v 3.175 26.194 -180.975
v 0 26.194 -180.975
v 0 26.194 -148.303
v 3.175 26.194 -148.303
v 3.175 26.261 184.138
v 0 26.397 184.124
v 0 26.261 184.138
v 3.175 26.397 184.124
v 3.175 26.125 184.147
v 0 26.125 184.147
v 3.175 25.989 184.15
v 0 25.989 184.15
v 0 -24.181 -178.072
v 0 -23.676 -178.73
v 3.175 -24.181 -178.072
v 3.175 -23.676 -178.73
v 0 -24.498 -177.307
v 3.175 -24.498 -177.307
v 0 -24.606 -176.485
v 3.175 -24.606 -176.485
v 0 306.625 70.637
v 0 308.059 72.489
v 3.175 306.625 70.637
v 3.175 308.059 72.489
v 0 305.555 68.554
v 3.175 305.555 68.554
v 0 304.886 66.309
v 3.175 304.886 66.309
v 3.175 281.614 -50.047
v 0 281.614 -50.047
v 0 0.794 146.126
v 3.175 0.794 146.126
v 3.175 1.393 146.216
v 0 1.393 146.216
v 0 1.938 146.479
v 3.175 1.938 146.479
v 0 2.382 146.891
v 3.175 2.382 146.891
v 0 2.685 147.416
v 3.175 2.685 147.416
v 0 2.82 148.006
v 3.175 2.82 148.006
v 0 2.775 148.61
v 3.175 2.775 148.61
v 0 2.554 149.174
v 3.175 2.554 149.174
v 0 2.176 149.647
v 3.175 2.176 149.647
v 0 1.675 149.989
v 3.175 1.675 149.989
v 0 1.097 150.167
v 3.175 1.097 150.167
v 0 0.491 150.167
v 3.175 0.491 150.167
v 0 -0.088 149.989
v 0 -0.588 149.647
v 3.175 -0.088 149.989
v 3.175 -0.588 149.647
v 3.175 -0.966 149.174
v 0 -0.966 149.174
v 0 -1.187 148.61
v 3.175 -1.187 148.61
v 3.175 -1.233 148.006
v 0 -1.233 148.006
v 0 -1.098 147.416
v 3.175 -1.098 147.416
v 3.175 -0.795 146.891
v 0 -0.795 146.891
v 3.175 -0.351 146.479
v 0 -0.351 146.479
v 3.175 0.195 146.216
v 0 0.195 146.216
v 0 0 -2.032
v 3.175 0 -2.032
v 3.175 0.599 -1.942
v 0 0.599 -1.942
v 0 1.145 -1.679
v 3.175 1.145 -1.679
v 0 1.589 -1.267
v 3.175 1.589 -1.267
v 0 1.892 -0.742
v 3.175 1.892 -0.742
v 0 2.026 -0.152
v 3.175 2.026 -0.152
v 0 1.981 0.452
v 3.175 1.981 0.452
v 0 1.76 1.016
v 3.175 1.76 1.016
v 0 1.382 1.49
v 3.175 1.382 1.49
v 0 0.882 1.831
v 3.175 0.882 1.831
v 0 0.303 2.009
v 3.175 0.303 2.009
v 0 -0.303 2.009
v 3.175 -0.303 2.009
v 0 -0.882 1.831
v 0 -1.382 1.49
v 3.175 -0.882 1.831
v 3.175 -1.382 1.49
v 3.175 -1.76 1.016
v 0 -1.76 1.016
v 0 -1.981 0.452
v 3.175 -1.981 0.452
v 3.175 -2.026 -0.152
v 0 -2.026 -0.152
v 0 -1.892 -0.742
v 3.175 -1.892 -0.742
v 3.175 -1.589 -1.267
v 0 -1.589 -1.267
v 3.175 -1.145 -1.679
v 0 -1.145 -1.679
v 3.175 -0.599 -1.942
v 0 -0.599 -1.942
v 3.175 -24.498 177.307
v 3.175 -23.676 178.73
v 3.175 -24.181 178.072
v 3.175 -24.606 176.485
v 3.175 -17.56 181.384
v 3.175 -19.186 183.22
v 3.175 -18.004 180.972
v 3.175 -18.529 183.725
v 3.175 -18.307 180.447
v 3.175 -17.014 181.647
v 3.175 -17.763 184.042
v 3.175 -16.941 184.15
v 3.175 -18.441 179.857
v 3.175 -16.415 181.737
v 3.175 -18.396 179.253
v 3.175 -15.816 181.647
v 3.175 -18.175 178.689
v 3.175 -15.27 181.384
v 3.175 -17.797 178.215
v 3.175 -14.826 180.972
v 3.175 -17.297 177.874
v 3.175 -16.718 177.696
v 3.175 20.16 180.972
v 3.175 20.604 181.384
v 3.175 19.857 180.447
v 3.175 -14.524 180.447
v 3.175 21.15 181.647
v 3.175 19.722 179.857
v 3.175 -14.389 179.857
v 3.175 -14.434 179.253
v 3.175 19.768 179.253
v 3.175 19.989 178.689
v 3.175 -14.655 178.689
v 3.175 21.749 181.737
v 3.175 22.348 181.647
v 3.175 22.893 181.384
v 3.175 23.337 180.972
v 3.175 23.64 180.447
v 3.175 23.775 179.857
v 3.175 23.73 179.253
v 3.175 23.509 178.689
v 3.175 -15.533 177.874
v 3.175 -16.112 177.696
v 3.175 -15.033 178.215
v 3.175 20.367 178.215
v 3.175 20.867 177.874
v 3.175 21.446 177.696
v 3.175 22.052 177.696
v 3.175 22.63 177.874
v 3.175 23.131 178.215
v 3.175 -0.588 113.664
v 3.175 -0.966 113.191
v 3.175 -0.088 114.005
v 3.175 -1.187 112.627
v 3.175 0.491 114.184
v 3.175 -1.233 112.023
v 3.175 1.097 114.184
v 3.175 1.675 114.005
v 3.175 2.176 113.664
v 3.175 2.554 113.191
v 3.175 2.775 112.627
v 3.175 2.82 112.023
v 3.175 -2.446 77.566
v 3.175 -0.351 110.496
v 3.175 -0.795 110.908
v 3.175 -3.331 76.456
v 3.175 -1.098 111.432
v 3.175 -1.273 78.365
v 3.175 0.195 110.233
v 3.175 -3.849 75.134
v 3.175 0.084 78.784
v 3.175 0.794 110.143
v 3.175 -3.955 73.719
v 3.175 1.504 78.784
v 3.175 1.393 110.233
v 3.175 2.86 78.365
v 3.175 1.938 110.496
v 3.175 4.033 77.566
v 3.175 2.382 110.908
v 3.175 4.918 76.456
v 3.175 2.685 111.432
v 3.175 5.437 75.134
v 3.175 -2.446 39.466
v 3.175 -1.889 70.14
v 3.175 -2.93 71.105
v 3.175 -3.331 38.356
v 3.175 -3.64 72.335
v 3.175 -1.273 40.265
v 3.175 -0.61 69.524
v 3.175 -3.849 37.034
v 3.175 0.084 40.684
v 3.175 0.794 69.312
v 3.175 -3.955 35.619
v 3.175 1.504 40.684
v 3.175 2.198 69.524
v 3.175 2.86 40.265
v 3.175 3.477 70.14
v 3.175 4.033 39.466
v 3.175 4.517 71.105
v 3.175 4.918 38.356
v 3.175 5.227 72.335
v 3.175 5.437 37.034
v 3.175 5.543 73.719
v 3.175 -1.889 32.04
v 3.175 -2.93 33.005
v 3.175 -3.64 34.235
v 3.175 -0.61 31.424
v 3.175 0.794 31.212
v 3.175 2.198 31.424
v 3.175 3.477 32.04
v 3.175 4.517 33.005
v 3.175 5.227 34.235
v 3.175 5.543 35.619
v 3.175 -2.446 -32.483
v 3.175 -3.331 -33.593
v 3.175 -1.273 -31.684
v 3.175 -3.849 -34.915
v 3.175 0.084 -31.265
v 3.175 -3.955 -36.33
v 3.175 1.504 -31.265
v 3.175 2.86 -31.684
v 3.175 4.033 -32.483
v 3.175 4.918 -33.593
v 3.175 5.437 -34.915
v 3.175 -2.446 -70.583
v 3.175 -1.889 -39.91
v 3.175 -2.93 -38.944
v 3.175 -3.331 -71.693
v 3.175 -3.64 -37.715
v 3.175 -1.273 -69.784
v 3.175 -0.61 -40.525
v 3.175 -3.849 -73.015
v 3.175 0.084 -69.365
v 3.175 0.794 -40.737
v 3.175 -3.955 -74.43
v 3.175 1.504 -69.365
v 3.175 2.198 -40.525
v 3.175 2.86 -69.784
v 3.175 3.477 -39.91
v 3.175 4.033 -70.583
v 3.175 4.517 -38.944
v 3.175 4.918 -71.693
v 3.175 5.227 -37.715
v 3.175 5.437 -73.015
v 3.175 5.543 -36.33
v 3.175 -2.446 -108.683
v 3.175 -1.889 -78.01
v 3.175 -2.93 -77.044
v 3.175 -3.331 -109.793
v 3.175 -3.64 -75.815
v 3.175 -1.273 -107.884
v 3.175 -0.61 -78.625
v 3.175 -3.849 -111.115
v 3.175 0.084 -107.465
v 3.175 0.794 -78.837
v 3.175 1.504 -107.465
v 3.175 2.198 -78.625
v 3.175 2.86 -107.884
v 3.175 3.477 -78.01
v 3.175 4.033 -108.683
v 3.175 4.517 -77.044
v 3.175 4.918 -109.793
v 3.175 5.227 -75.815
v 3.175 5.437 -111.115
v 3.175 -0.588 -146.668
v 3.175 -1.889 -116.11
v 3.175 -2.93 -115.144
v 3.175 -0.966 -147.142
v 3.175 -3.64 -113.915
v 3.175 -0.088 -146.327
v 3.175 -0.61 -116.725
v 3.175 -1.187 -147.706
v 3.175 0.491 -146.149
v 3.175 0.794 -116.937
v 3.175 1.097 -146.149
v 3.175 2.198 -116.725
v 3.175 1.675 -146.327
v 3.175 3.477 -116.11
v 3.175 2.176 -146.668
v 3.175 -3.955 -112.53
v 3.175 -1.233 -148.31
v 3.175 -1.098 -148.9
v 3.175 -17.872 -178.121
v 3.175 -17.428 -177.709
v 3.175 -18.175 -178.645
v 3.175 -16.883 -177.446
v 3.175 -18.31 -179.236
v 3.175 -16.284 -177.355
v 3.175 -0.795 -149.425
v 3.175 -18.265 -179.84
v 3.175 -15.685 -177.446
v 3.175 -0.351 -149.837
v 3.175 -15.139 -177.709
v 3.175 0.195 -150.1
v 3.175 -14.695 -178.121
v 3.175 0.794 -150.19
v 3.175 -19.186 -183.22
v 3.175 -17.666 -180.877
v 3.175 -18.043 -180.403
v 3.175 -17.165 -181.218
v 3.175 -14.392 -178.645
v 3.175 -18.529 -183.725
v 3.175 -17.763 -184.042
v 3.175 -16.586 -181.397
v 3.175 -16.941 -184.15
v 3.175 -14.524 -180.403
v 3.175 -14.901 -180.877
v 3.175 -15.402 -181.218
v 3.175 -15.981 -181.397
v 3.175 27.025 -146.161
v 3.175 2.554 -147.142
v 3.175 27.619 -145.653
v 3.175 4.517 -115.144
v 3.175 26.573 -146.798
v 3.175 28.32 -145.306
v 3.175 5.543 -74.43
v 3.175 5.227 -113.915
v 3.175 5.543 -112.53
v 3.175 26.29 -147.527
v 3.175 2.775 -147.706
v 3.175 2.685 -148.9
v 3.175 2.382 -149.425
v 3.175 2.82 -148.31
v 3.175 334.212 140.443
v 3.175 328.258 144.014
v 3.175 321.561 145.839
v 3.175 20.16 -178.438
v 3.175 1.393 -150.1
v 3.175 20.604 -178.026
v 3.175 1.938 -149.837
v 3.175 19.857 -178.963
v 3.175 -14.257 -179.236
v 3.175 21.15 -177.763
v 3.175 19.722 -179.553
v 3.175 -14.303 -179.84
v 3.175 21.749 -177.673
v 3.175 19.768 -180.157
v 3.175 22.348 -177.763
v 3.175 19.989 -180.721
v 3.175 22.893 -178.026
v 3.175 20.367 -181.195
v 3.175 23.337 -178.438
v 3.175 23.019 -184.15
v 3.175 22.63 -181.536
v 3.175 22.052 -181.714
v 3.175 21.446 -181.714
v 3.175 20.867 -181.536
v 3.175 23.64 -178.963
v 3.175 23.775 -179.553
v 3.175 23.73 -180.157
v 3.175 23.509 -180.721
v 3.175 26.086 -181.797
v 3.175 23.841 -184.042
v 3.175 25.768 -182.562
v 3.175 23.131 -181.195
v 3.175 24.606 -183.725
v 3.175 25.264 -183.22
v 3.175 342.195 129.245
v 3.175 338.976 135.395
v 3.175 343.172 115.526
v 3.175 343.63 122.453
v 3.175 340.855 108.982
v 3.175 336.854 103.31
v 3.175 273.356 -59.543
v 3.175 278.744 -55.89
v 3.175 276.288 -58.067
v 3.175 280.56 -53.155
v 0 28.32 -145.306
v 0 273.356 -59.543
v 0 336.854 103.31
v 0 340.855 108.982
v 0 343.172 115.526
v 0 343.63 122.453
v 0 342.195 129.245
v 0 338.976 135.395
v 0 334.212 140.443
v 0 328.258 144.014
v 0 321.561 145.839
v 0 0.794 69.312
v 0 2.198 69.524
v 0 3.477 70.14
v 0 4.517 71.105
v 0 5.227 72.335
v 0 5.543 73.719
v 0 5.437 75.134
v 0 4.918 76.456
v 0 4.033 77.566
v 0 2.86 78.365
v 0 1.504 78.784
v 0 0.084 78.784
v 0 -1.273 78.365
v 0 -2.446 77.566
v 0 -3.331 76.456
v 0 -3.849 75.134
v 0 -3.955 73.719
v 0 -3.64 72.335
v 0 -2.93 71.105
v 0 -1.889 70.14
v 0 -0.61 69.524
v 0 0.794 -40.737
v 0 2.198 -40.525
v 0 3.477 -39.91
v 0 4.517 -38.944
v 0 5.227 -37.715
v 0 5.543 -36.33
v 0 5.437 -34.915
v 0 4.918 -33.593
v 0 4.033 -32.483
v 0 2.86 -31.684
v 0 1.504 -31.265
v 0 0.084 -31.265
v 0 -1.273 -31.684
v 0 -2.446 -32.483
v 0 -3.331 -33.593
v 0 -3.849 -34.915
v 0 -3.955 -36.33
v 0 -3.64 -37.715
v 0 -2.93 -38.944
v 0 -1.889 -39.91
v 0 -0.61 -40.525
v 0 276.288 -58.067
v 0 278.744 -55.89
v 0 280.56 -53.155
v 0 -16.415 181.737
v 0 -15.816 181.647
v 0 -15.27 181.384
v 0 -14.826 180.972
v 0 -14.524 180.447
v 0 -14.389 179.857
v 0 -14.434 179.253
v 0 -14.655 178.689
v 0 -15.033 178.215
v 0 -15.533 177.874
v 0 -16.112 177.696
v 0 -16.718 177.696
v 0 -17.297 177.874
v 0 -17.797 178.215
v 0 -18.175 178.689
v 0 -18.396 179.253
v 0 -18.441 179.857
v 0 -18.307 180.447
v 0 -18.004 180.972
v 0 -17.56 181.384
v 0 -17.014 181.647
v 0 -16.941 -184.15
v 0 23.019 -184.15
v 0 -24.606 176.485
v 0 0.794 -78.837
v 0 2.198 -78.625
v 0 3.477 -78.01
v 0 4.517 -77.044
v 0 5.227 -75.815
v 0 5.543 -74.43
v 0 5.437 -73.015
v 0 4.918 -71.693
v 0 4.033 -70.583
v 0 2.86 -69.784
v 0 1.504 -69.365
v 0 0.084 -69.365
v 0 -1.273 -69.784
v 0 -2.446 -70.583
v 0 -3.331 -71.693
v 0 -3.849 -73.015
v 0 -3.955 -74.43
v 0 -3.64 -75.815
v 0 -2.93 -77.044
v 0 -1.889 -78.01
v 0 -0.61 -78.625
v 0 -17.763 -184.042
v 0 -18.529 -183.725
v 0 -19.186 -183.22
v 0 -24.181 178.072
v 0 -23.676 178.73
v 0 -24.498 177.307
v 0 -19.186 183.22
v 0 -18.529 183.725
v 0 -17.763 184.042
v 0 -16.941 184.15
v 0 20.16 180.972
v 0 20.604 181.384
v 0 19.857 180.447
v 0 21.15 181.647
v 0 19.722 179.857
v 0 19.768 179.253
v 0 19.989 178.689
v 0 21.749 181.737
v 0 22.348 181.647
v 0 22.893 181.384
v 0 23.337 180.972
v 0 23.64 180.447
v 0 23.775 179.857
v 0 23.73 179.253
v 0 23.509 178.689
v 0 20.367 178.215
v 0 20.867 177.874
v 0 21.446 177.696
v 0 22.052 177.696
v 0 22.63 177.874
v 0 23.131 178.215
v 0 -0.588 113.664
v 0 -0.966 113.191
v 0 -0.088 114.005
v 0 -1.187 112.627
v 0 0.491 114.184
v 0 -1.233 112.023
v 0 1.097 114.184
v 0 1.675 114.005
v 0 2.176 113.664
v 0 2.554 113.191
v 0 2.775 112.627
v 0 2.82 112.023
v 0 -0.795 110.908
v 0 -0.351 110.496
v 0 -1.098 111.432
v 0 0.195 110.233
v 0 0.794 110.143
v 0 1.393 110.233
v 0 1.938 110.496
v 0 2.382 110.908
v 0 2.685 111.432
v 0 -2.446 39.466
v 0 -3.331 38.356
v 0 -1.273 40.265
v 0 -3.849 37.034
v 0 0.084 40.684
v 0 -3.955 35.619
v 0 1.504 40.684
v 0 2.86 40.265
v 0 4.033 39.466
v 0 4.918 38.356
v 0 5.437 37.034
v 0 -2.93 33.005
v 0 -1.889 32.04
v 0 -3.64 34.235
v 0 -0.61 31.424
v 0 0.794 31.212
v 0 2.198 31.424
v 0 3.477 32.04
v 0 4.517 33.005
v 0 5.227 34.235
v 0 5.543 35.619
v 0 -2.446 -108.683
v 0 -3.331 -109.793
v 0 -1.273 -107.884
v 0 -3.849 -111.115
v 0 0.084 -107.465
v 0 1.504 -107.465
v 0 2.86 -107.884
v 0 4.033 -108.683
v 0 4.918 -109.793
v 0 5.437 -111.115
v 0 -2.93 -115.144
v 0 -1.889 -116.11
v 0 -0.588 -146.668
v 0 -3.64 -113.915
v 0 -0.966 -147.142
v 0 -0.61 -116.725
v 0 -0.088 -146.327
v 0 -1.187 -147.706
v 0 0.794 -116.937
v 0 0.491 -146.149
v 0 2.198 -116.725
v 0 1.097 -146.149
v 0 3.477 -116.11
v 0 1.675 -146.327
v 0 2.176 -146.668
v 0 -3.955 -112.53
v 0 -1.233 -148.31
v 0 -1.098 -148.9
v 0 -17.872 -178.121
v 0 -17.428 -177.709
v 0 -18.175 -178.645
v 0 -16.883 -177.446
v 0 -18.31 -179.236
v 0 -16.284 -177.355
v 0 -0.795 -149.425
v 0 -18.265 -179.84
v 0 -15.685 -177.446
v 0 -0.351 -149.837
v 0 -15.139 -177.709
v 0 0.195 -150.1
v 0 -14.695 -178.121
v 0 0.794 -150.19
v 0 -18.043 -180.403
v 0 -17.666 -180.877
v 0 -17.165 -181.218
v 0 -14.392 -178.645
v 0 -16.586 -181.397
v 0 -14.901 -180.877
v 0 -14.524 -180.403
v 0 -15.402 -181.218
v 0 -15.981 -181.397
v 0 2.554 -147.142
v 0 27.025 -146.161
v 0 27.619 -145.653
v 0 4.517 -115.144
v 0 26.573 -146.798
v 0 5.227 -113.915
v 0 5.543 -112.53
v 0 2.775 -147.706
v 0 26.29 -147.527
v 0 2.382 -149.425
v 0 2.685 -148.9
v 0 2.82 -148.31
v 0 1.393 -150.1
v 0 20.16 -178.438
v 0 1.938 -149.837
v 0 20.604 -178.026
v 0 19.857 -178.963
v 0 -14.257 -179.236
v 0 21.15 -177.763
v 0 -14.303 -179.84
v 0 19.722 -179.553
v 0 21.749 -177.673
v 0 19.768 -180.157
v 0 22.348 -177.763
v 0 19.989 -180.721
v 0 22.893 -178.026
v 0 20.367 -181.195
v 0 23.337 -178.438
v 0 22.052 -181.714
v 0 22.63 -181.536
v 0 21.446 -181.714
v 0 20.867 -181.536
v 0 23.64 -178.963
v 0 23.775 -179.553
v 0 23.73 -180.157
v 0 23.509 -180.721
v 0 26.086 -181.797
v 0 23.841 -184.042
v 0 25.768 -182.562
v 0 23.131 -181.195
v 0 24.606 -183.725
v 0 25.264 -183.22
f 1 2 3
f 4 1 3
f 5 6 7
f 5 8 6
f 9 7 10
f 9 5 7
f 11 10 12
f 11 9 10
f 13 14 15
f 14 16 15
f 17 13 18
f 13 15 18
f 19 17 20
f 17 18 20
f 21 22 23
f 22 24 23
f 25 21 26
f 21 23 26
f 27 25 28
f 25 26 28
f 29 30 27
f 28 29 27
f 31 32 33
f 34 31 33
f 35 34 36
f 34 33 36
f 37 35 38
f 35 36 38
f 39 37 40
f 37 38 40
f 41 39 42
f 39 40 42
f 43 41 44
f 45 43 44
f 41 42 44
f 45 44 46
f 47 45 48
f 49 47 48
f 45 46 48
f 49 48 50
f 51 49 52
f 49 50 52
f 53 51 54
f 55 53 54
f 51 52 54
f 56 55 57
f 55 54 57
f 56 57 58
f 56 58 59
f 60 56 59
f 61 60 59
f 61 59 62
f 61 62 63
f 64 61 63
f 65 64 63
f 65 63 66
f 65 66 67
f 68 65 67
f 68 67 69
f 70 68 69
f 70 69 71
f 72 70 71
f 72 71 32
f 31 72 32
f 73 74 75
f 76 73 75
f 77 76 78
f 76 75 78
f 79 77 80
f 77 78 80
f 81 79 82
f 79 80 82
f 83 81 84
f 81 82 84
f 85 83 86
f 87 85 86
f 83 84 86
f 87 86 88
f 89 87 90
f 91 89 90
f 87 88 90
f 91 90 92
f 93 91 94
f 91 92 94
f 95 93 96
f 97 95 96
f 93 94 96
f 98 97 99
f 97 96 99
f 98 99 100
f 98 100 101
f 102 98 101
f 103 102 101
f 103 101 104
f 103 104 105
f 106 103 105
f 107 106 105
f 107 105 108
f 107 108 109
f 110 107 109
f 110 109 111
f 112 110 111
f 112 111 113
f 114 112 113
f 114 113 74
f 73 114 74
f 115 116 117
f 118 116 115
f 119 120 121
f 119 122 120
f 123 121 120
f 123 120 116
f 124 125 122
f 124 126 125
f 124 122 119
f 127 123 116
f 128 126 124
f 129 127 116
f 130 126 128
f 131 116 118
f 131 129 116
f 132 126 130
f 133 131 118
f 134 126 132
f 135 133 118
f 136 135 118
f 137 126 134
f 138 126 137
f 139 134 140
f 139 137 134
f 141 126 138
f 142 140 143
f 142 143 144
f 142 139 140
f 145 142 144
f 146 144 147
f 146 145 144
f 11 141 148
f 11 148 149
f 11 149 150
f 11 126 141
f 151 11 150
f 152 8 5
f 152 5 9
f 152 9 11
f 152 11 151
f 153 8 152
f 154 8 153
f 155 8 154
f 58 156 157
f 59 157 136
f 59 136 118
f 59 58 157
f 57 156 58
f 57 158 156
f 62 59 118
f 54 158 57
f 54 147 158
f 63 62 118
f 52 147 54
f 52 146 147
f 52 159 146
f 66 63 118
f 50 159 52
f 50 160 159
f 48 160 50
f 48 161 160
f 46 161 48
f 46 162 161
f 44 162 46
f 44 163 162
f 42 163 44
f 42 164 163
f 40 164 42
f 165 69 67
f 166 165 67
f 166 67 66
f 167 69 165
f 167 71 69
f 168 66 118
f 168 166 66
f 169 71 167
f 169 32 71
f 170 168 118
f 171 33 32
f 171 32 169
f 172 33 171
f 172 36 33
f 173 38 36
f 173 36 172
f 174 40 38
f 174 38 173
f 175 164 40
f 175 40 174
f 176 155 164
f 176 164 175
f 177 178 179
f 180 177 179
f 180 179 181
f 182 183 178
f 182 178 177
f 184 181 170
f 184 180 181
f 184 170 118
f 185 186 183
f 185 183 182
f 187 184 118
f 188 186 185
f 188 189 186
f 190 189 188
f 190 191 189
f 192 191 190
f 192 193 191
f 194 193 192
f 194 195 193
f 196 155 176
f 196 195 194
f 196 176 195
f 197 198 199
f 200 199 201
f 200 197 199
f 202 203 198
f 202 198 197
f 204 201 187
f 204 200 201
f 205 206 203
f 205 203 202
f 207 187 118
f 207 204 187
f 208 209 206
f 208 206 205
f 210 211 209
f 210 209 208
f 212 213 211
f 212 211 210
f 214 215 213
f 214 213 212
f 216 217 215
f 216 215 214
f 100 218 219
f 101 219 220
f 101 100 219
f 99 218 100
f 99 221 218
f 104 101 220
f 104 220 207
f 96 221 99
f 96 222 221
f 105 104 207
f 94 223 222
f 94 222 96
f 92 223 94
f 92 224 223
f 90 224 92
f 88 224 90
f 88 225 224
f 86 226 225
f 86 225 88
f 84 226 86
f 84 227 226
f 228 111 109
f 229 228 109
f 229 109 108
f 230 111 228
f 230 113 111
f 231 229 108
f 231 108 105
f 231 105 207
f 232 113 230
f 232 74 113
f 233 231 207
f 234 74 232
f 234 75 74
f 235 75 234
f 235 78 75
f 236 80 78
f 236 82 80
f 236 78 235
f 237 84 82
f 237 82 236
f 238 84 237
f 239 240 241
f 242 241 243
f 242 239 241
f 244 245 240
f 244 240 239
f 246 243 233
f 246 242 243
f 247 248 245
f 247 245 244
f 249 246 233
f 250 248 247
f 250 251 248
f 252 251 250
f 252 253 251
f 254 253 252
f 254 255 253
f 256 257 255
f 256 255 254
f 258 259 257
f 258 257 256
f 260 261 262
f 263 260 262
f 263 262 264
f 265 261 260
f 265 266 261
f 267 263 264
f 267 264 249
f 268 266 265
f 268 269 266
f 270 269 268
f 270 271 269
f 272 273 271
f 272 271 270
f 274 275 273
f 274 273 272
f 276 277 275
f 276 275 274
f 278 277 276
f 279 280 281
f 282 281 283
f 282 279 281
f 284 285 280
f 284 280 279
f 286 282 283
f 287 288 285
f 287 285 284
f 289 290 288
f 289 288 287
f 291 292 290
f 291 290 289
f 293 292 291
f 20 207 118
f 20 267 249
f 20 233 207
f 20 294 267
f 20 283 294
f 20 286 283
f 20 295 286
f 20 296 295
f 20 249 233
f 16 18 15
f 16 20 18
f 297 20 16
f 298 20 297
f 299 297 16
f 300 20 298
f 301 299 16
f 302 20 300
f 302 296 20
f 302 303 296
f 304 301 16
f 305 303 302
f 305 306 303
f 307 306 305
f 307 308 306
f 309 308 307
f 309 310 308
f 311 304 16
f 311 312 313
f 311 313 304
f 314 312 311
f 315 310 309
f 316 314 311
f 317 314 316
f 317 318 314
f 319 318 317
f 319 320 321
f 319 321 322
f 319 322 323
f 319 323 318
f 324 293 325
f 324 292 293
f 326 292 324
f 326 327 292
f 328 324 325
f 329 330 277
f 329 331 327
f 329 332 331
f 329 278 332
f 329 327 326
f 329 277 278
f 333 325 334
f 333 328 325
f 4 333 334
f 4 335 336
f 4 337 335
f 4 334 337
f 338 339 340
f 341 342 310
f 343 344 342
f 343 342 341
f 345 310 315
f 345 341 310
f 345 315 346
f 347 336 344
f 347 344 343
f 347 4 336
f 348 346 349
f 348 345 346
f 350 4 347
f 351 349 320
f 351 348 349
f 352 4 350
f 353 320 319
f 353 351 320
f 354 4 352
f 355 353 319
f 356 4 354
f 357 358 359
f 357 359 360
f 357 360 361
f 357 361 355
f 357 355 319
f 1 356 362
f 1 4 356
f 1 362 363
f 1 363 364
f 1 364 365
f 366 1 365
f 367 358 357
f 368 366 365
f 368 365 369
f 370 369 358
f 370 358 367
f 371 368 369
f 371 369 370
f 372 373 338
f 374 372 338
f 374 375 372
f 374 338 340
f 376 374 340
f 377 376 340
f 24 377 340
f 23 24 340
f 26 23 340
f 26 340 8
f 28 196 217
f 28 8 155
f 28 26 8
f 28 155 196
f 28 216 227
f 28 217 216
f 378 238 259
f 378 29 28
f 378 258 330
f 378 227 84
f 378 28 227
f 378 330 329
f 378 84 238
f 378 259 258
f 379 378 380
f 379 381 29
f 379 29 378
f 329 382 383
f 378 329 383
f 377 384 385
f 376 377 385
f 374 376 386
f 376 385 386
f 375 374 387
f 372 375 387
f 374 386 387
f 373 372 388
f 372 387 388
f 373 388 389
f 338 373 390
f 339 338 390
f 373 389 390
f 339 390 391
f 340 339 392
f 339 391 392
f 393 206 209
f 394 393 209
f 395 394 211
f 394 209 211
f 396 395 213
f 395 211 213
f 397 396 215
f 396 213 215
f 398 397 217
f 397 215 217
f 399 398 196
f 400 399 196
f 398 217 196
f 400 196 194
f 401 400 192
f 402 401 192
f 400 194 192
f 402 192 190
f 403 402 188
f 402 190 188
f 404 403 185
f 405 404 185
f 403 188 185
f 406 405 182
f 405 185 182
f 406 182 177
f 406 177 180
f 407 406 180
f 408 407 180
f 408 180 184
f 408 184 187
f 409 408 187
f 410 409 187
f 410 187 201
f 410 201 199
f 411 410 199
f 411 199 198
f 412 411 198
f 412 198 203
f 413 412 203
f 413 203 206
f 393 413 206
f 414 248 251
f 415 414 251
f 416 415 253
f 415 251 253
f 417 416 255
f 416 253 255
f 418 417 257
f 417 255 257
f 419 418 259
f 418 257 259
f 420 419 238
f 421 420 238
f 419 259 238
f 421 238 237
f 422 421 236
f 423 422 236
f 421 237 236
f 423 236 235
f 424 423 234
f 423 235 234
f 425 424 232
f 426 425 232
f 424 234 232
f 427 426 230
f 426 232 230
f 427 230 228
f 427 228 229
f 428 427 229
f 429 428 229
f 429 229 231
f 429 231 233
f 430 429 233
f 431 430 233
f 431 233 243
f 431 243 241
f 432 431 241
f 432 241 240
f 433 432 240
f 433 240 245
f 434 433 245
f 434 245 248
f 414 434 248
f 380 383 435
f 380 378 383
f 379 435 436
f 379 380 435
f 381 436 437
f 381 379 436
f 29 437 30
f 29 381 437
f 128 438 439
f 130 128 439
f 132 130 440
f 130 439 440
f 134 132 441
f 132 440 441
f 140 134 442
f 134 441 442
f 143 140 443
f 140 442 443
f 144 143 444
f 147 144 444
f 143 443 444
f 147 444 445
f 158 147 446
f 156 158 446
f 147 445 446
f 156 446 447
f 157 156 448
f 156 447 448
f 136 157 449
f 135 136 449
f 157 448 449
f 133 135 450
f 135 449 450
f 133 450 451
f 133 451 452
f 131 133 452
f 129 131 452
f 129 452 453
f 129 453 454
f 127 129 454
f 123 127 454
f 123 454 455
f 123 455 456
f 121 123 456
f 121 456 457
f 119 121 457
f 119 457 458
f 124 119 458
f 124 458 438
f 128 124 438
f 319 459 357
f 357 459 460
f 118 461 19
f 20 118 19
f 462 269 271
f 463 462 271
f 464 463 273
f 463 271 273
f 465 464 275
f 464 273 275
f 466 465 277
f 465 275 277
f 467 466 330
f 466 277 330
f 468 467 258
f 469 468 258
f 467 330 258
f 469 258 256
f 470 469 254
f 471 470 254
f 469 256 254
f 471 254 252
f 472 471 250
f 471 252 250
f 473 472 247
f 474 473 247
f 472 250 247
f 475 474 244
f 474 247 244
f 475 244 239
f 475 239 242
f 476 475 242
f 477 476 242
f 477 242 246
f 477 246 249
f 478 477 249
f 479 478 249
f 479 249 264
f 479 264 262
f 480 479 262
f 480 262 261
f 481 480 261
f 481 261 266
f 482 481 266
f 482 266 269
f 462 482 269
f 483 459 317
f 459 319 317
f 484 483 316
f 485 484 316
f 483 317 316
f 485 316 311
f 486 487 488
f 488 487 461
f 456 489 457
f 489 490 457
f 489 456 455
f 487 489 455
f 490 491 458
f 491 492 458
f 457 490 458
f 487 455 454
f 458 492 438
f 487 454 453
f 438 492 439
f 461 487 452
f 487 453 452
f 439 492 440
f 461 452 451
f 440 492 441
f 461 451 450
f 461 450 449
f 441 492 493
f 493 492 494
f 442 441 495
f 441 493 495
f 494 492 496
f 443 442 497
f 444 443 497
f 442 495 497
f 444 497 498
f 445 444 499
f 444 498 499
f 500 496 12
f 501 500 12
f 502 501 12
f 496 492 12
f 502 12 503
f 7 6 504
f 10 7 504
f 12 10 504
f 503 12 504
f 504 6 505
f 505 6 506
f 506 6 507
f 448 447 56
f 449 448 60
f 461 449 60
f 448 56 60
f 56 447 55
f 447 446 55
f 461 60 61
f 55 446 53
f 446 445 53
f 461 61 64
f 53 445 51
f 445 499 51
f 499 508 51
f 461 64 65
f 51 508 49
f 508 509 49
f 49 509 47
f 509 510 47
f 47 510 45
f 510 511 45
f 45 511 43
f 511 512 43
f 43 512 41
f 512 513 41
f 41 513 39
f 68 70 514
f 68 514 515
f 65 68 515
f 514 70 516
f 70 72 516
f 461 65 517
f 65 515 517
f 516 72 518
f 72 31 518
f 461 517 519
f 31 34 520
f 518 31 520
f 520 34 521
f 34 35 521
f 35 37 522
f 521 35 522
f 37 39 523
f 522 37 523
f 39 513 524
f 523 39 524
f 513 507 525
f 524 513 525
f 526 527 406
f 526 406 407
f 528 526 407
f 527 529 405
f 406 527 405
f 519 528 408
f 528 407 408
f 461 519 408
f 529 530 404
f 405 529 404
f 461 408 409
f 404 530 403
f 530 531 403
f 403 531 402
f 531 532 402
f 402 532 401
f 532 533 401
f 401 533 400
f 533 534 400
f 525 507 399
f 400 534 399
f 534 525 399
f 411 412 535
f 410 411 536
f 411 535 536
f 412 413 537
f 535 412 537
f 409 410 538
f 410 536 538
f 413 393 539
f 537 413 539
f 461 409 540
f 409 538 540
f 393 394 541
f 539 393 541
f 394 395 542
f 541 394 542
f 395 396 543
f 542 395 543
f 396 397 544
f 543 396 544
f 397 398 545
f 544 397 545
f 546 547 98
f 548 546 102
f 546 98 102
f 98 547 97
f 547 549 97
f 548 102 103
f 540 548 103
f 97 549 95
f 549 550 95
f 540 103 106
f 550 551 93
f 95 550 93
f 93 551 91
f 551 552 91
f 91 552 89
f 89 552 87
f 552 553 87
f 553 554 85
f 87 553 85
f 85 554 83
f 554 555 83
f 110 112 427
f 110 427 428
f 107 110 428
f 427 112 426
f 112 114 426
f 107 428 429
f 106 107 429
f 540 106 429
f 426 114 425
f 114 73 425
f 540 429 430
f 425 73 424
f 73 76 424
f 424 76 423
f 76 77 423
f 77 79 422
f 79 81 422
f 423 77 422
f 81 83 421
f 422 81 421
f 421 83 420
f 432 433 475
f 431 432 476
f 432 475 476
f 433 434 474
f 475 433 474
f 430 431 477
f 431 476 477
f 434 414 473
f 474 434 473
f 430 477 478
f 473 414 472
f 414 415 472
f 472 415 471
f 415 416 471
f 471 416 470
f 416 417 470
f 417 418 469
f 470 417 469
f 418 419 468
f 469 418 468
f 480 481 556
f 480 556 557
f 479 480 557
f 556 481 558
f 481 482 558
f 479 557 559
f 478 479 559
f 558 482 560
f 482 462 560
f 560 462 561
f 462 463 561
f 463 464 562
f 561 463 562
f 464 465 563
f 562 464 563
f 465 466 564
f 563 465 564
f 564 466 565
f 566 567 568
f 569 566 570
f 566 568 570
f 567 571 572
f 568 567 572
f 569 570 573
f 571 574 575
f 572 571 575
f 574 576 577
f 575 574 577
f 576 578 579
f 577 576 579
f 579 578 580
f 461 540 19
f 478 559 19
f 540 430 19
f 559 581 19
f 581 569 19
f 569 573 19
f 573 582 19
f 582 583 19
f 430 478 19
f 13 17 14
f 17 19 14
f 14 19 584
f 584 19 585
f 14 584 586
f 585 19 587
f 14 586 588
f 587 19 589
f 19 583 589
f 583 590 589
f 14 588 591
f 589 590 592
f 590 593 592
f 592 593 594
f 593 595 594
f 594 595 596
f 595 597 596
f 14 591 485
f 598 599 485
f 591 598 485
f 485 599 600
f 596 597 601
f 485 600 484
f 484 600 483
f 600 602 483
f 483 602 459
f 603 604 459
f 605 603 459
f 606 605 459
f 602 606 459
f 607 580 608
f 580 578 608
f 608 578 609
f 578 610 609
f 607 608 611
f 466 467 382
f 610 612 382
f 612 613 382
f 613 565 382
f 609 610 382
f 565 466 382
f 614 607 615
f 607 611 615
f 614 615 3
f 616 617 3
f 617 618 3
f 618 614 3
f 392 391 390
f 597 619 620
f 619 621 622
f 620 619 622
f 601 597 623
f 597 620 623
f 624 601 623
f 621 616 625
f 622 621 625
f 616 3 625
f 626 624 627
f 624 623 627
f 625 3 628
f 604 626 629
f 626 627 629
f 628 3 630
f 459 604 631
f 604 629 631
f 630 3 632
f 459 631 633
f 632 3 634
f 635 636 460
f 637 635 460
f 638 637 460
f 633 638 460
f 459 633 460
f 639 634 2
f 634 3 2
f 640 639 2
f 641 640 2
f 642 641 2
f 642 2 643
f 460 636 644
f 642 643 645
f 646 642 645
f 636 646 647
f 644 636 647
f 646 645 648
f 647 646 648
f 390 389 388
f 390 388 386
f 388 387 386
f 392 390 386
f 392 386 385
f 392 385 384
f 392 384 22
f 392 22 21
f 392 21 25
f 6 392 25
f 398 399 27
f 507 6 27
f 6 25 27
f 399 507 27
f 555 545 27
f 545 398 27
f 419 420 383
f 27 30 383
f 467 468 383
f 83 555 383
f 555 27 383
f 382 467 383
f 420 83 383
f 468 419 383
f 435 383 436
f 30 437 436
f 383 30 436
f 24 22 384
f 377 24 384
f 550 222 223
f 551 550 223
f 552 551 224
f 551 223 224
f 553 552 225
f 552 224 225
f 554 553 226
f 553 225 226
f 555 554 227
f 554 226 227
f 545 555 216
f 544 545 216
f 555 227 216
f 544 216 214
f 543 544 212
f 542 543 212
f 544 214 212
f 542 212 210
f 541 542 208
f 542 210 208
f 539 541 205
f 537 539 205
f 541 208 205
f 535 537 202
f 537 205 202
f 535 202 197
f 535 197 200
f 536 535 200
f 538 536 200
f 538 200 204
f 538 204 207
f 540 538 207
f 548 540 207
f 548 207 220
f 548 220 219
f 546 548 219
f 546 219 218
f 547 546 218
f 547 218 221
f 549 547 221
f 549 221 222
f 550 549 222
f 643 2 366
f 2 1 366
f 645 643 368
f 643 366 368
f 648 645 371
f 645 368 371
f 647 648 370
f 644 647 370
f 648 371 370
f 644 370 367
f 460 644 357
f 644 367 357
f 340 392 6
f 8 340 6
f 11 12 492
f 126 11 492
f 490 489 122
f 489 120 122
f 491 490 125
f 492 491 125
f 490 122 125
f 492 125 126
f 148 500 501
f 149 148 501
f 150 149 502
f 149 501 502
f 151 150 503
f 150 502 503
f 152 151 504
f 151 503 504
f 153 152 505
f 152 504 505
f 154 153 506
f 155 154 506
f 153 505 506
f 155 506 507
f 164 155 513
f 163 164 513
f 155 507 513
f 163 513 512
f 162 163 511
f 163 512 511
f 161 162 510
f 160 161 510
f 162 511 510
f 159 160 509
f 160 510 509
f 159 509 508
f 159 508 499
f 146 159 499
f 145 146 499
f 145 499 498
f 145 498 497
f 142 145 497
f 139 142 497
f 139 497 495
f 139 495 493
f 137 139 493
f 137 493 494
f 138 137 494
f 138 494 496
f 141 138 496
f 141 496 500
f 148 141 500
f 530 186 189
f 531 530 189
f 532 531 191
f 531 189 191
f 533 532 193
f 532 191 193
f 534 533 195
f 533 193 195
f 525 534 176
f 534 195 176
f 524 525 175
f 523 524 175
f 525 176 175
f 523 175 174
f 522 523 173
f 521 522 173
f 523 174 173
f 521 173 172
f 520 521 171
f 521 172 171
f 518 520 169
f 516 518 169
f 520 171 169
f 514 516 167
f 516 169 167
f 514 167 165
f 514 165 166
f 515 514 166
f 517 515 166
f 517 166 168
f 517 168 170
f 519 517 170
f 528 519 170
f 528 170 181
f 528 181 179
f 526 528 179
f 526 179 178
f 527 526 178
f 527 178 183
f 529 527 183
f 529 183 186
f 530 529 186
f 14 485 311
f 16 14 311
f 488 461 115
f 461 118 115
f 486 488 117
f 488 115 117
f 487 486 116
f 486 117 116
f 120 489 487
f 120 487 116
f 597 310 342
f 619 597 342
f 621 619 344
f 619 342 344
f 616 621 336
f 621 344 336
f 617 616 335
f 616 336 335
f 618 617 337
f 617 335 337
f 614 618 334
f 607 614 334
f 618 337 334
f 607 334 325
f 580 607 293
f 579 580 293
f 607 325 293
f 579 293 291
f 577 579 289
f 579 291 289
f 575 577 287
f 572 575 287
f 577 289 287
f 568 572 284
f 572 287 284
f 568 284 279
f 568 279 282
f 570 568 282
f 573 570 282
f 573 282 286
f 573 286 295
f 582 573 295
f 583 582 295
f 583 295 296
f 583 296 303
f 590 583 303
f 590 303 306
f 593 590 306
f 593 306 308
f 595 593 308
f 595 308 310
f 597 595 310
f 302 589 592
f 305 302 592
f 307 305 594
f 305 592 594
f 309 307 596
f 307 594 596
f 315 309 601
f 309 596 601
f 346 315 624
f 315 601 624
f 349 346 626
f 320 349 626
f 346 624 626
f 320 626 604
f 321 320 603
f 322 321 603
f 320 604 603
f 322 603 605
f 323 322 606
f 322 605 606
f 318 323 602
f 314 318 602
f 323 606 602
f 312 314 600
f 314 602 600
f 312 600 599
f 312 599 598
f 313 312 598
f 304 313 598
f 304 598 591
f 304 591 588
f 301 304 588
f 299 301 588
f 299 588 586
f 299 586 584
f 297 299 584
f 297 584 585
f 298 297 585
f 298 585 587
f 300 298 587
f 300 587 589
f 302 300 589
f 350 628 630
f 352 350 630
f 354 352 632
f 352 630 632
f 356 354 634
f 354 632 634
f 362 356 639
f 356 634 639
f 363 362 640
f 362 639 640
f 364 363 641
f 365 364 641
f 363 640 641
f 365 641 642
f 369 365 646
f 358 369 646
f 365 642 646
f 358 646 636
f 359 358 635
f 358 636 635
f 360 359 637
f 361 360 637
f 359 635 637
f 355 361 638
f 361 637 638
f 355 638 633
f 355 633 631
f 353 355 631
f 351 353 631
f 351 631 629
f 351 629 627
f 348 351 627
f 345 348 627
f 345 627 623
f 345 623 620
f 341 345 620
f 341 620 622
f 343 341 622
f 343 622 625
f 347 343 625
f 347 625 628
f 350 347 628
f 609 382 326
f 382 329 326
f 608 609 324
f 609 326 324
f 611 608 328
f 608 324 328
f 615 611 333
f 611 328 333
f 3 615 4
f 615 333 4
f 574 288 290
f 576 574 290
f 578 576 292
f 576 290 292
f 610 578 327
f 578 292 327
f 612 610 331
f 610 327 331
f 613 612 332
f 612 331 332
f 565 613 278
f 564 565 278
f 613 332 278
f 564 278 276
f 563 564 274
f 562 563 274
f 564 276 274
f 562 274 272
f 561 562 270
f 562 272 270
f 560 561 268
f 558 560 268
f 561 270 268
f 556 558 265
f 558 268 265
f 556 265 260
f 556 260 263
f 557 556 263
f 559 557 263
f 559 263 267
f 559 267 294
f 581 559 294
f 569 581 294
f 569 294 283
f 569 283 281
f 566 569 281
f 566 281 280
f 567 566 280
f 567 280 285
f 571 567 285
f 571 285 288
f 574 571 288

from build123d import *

# Parameters (mm, degrees)
BOSS_EXTRUDE1_DEPTH          = 3.175
CHAMFER1_SIZE                = 6.35
FILLET1_R                    = 12.7
F_3_8_0_375_DIAMETER_HOLE1_D = 9.525
F_8_CLEARANCE_HOLE1_D        = 4.064
FILLET2_R                    = 3.175
FILLET3_R                    = 3.175
F_8_CLEARANCE_HOLE2_D        = 4.064


with BuildPart() as part:
    # Sketch1 → Boss-Extrude1 (new body)
    with BuildSketch(Plane(origin=(0, 0, 0), x_dir=(0, 0, -1), z_dir=(1, 0, 0))):
        with BuildLine():
            Line((-184.15, -24.60625), (184.15, -24.60625))
            Line((184.15, -24.60625), (184.15, 26.19375))
            Line((184.15, 26.19375), (146.05, 26.19375))
            Line((146.05, 26.19375), (57.15, 280.19375))
            Line((57.15, 280.19375), (-69.85, 305.59375))
            Line((-69.85, 305.59375), (-103.309941035, 336.853985858))
            ThreePointArc((-103.309941035, 336.853985858), (-129.244818111, 342.195404789), (-145.838997174, 321.560923299))
            Line((-145.838997174, 321.560923299), (-184.15, 26.19375))
            Line((-184.15, 26.19375), (-184.15, -24.60625))
        make_face()
    extrude(amount=BOSS_EXTRUDE1_DEPTH)

    # Chamfer1
    chamfer1_edges = [part.edges().sort_by_distance(p)[0] for p in [
        (1.5875, -24.60625, -184.15),
        (1.5875, -24.60625, 184.15),
    ]]
    chamfer(chamfer1_edges, length=CHAMFER1_SIZE)

    # Fillet1
    fillet1_edges = [part.edges().sort_by_distance(p)[0] for p in [
        (1.5875, 305.59375, 69.85),
        (1.5875, 280.19375, -57.15),
    ]]
    fillet(fillet1_edges, radius=FILLET1_R)

    # 3/8 (0.375) Diameter Hole1 (through all)
    with Locations(Plane.ZY):
        with Locations((-112.174577673, 0.79375), (-74.074577673, 0.79375), (-35.974577673, 0.79375), (35.974577673, 0.79375), (74.074577673, 0.79375)):
            Hole(F_3_8_0_375_DIAMETER_HOLE1_D / 2)

    # #8 Clearance Hole1 (through all)
    with Locations(Plane.ZY):
        with Locations((148.157911006, 0.79375), (112.174577673, 0.79375), (-148.157911006, 0.79375), (0, 0)):
            Hole(F_8_CLEARANCE_HOLE1_D / 2)

    # Fillet2
    fillet2_edges = [part.edges().sort_by_distance(p)[0] for p in [
        (1.5875, 26.19375, 184.15),
        (1.5875, 26.19375, -146.05),
        (1.5875, 26.19375, -184.15),
    ]]
    fillet(fillet2_edges, radius=FILLET2_R)

    # Fillet3
    fillet3_edges = [part.edges().sort_by_distance(p)[0] for p in [
        (1.5875, -24.60625, -177.8),
        (1.5875, -24.60625, 177.8),
        (1.5875, -18.25625, 184.15),
        (1.5875, -18.25625, -184.15),
    ]]
    fillet(fillet3_edges, radius=FILLET3_R)

    # #8 Clearance Hole2 (through all)
    with Locations(Plane(origin=(3.175, 0, 0), x_dir=(0, 0, -1), z_dir=(1, 0, 0))):
        with Locations((-179.705, 21.74875), (-179.705, -16.415070715), (179.705, 21.74875), (179.3875, -16.283557909)):
            Hole(F_8_CLEARANCE_HOLE2_D / 2)


solid = part.part
